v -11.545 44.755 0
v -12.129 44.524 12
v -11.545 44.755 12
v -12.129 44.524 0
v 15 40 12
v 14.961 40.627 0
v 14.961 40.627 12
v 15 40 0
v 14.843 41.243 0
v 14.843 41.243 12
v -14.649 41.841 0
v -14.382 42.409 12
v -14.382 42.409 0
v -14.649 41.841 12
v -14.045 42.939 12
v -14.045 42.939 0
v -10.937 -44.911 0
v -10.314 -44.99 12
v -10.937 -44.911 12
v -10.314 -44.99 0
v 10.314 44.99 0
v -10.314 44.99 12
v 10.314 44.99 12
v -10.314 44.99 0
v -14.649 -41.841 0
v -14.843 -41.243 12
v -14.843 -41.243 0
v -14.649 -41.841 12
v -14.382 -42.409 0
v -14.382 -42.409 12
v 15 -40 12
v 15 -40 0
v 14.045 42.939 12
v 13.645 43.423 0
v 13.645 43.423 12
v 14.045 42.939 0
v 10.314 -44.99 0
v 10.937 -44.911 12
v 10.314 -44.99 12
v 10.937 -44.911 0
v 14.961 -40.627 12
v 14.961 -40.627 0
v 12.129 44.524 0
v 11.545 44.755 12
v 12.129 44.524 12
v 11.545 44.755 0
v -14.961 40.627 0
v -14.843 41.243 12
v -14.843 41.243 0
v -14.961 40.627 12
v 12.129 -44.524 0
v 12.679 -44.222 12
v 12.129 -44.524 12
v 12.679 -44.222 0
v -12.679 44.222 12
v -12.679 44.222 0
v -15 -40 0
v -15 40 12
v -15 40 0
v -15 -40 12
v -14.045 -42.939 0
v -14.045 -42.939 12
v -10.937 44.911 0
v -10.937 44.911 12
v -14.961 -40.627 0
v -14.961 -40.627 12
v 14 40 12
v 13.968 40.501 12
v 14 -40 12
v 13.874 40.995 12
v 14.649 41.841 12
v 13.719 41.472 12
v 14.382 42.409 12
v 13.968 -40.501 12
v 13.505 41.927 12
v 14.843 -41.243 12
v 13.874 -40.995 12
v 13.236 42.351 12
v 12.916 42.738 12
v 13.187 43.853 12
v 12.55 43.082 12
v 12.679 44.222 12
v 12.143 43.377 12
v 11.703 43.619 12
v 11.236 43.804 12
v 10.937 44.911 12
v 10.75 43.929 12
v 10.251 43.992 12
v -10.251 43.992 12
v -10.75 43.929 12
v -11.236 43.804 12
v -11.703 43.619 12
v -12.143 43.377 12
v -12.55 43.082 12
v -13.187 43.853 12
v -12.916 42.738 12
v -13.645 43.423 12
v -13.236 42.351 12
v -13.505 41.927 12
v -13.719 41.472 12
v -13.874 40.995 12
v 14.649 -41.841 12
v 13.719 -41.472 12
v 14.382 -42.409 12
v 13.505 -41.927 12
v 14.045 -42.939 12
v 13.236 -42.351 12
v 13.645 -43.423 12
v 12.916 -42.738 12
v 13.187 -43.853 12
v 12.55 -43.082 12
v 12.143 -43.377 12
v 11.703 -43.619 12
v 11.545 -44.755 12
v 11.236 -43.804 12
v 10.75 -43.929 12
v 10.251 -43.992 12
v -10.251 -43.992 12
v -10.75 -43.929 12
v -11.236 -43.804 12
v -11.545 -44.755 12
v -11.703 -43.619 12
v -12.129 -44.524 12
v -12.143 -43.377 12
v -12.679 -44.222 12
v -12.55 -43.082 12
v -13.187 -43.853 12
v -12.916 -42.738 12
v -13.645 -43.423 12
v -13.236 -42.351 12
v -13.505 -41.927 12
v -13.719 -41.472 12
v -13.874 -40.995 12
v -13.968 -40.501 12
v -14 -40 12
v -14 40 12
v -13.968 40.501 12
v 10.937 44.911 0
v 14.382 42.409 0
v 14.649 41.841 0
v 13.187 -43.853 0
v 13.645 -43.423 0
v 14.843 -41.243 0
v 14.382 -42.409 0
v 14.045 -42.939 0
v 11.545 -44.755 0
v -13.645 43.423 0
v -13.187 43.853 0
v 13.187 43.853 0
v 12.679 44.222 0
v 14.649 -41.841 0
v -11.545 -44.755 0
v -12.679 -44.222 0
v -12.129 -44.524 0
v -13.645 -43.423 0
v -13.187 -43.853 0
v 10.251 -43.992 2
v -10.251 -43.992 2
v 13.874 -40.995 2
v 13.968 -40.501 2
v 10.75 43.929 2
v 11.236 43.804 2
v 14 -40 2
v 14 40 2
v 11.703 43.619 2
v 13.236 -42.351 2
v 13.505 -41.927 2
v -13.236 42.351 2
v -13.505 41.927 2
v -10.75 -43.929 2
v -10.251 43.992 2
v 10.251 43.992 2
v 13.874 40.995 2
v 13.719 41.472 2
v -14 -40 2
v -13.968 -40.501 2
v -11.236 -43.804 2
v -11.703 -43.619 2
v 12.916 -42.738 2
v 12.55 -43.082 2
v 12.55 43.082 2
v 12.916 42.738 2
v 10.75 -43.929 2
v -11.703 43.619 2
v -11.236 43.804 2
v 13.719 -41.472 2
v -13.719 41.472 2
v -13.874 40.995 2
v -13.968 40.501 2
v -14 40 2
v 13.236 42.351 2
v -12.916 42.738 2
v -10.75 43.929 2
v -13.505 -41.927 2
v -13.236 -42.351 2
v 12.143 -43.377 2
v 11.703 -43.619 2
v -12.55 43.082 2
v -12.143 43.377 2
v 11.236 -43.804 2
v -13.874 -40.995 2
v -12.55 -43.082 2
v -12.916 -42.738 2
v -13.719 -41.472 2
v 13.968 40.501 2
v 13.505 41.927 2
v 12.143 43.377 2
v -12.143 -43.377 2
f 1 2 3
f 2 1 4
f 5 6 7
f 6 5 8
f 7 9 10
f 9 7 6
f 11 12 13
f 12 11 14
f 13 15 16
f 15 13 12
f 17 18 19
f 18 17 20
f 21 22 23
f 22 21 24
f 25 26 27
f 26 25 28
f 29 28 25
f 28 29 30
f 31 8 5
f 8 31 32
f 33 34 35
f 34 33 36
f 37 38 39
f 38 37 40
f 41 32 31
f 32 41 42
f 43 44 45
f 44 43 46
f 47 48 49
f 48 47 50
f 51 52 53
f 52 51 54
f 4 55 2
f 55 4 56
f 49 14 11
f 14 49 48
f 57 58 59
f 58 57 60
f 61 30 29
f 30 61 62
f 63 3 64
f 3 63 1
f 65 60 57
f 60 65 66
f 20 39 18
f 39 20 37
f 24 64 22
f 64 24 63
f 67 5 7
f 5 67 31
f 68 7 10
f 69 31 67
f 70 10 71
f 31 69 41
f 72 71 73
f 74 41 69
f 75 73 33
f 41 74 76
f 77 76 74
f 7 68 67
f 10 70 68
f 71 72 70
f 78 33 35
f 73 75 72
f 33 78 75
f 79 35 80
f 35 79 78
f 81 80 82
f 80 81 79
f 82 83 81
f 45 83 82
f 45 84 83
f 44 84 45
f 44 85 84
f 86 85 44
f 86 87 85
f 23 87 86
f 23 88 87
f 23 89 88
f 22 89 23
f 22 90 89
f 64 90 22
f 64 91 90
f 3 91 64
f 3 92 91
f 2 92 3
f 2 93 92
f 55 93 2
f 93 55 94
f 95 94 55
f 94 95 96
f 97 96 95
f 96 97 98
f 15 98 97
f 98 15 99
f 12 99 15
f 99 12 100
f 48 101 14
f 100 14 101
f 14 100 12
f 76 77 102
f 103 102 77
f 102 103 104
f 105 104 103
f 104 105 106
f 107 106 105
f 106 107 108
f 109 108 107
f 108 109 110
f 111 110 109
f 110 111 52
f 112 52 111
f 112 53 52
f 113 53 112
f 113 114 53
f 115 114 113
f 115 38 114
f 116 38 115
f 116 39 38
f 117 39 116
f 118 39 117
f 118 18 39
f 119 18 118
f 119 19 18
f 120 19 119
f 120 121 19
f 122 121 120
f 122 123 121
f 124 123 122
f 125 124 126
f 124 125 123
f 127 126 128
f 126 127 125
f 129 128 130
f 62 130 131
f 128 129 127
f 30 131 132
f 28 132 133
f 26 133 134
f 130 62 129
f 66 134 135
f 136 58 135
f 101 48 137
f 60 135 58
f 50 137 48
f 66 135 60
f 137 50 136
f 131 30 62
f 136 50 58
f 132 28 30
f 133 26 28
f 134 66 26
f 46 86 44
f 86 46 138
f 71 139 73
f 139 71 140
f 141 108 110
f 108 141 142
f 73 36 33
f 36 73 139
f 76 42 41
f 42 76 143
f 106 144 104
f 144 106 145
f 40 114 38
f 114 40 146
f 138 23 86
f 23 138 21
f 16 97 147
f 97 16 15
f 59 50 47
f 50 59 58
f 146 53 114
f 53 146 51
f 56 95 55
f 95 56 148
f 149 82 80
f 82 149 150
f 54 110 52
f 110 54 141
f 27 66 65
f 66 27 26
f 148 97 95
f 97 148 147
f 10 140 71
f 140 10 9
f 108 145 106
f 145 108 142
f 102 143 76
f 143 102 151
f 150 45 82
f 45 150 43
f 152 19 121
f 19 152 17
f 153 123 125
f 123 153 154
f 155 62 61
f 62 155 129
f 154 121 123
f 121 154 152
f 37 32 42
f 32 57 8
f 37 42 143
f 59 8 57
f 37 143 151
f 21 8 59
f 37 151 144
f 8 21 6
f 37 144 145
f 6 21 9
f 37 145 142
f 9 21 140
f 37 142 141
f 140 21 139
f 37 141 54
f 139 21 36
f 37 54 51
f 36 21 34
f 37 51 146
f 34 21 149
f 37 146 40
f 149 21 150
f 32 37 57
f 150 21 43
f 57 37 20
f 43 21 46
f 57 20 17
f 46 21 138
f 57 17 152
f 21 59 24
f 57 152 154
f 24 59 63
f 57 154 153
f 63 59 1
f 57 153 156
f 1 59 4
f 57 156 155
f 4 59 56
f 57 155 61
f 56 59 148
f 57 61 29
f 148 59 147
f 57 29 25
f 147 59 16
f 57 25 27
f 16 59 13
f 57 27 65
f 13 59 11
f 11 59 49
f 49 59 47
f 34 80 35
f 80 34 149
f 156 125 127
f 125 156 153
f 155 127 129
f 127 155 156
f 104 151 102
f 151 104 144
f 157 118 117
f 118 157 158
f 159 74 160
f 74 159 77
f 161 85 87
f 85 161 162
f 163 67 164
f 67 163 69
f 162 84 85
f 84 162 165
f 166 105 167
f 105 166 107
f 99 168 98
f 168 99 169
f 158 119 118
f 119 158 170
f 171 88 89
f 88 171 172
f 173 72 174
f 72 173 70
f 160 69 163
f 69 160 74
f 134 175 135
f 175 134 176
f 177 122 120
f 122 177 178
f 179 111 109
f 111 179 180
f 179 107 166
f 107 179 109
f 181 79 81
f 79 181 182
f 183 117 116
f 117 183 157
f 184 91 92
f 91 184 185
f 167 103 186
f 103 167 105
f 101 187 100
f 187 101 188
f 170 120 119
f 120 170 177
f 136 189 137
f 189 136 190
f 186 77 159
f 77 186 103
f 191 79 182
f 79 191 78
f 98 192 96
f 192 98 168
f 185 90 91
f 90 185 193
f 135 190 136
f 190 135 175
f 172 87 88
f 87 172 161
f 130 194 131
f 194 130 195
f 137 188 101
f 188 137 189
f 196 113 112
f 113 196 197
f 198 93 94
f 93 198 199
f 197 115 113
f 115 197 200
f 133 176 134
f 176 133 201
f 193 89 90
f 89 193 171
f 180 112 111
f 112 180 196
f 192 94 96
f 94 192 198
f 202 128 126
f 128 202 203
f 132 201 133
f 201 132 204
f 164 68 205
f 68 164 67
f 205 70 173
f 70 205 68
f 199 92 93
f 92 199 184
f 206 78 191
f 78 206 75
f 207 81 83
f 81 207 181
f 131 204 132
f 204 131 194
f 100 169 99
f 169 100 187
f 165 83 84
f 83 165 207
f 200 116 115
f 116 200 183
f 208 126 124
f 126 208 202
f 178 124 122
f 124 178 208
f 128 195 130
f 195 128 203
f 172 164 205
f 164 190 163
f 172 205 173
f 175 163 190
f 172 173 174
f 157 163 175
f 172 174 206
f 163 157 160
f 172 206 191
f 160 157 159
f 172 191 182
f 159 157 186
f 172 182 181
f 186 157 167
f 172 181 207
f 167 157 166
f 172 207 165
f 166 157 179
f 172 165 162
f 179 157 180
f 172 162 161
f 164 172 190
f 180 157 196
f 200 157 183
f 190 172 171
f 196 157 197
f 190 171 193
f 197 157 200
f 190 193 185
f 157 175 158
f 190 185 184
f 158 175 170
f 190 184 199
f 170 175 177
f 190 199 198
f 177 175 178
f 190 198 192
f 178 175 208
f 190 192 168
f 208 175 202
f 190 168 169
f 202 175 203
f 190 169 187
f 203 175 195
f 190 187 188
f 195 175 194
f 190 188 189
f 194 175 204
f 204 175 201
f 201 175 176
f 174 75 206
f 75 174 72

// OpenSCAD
$fn = 50;


difference() {
	union() {
		hull() {
			translate(v = [-10.0000000000, 40.0000000000, 0]) {
				cylinder(h = 12, r = 5);
			}
			translate(v = [10.0000000000, 40.0000000000, 0]) {
				cylinder(h = 12, r = 5);
			}
			translate(v = [-10.0000000000, -40.0000000000, 0]) {
				cylinder(h = 12, r = 5);
			}
			translate(v = [10.0000000000, -40.0000000000, 0]) {
				cylinder(h = 12, r = 5);
			}
		}
	}
	union() {
		translate(v = [0, 0, 2]) {
			hull() {
				translate(v = [-10.0000000000, 40.0000000000, 0]) {
					cylinder(h = 10, r = 4);
				}
				translate(v = [10.0000000000, 40.0000000000, 0]) {
					cylinder(h = 10, r = 4);
				}
				translate(v = [-10.0000000000, -40.0000000000, 0]) {
					cylinder(h = 10, r = 4);
				}
				translate(v = [10.0000000000, -40.0000000000, 0]) {
					cylinder(h = 10, r = 4);
				}
			}
		}
	}
}
